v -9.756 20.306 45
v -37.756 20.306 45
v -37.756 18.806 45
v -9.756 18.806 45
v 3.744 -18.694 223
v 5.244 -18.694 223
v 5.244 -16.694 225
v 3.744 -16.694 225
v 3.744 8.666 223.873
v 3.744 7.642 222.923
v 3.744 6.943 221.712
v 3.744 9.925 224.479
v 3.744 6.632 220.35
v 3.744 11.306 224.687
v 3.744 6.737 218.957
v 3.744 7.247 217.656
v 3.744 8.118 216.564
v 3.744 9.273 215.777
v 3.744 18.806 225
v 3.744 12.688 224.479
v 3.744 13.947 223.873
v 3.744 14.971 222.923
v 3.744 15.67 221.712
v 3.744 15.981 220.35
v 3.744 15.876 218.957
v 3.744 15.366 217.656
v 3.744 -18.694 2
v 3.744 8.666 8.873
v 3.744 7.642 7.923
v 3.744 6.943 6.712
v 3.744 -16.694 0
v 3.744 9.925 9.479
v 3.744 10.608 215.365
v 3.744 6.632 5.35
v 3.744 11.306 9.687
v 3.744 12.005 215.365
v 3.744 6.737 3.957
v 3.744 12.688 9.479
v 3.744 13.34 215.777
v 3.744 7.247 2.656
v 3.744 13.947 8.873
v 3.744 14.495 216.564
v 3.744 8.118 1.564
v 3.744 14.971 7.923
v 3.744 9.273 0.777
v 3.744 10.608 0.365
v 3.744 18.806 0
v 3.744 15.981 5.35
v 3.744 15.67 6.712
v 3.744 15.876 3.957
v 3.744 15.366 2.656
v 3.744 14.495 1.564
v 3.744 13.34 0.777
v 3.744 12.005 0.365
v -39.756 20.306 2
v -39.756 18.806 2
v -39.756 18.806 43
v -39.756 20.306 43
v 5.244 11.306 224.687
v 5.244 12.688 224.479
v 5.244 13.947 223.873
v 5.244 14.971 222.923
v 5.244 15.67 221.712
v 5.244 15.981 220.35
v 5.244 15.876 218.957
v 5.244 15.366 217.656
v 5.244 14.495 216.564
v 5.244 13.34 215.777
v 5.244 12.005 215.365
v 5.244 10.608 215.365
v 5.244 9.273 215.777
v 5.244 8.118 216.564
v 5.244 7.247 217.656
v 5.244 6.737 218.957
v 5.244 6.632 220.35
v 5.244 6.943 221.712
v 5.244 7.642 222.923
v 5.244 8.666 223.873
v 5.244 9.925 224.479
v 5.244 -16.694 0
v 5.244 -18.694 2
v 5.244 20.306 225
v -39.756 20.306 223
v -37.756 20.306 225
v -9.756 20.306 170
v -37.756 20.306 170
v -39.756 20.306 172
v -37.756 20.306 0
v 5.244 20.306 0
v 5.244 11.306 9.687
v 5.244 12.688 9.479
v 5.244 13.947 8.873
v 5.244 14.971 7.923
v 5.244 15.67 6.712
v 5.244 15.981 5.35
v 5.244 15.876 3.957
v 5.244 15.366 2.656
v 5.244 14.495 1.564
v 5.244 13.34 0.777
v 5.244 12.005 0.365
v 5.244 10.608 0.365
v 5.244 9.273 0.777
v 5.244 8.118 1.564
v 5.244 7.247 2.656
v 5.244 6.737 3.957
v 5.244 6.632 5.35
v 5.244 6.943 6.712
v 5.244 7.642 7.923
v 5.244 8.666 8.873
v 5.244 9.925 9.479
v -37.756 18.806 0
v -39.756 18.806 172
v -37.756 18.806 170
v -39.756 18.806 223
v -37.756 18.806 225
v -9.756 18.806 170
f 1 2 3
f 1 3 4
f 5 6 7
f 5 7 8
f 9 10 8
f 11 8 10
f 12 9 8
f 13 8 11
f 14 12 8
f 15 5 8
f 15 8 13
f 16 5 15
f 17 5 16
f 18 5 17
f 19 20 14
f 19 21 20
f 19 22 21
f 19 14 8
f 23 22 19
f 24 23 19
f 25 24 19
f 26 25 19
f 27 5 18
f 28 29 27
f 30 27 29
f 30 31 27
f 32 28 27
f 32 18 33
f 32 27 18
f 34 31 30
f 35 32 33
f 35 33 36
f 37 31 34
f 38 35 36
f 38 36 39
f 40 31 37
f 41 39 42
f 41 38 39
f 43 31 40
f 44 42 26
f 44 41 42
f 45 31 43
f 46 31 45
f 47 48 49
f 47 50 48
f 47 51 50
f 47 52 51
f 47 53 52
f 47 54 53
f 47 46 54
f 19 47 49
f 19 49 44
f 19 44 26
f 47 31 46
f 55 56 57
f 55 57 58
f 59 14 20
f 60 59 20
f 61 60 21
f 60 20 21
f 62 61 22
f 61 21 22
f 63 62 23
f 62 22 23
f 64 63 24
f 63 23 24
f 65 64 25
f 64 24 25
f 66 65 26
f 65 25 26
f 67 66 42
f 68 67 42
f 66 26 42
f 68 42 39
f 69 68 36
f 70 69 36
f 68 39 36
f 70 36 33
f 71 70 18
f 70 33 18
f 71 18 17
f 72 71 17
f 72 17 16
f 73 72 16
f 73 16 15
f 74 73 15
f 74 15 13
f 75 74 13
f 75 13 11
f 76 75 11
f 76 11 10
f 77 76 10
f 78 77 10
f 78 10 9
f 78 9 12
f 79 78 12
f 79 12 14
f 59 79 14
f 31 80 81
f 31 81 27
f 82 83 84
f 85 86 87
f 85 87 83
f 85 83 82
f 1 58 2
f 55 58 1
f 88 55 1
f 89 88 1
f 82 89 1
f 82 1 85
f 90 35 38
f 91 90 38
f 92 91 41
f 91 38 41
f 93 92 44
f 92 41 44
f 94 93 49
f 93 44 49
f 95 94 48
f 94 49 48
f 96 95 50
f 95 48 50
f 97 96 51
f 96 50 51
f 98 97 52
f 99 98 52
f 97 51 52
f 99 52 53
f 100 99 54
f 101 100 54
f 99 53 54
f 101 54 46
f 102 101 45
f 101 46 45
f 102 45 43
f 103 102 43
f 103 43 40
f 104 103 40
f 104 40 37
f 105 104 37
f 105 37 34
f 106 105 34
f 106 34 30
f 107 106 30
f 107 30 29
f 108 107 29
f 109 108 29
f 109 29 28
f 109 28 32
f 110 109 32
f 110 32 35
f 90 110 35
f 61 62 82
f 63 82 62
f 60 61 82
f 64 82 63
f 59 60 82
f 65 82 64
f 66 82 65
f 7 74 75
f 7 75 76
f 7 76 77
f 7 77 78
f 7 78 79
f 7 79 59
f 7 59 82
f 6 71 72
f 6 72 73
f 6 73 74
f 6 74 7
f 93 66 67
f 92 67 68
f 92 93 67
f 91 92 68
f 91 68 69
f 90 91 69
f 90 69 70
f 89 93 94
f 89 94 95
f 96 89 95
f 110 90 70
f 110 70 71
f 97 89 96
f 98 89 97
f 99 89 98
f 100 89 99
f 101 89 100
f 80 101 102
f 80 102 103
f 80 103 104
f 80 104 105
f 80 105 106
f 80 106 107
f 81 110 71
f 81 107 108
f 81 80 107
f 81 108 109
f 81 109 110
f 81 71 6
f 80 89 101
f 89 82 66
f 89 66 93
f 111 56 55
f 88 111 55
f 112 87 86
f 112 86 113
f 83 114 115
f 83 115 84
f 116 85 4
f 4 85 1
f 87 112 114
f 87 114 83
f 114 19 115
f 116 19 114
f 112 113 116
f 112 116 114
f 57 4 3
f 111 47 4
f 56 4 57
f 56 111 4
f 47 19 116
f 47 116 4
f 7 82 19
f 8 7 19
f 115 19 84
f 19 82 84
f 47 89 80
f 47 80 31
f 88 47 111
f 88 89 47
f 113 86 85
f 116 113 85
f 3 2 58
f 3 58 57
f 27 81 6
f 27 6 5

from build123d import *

# Parameters (mm, degrees)
BOSS_EXTRUDE1_DEPTH = 225
SKETCH3_W           = 30
SKETCH3_H           = 125
CUT_EXTRUDE1_DEPTH  = 225
SKETCH4_R           = 4.687343619
CUT_EXTRUDE2_DEPTH  = 225
CHAMFER1_SIZE       = 2


with BuildPart() as part:
    # Sketch1 → Boss-Extrude1 (new body)
    with BuildSketch(Plane.XY):
        Polygon((-39.755639098, 20.306390977), (5.244360902, 20.306390977), (5.244360902, -18.693609023), (3.744360902, -18.693609023), (3.744360902, 18.806390977), (-39.755639098, 18.806390977), align=None)
    extrude(amount=BOSS_EXTRUDE1_DEPTH)

    # Sketch3 → Cut-Extrude1 (cut)
    with BuildSketch(Plane(origin=(0, 20.306390977, 0), x_dir=(1, 0, 0), z_dir=(0, 1, 0))):
        with Locations((-24.755639098, -107.5)):
            Rectangle(SKETCH3_W, SKETCH3_H)
    extrude(amount=-CUT_EXTRUDE1_DEPTH, mode=Mode.SUBTRACT)

    # Sketch4 → Cut-Extrude2 (cut)
    with BuildSketch(Plane.ZY.offset(-3.744360902)):
        with Locations((5, 11.306390977)):
            Circle(SKETCH4_R)
        with Locations((220, 11.306390977)):
            Circle(SKETCH4_R)
    extrude(amount=-CUT_EXTRUDE2_DEPTH, mode=Mode.SUBTRACT)

    # Chamfer1
    chamfer1_edges = [part.edges().sort_by_distance(p)[0] for p in [
        (4.494360902, -18.693609023, 225),
        (-39.755639098, 19.556390977, 170),
        (-39.755639098, 19.556390977, 45),
        (-39.755639098, 19.556390977, 225),
        (4.494360902, -18.693609023, 0),
        (-39.755639098, 19.556390977, 0),
    ]]
    chamfer(chamfer1_edges, length=CHAMFER1_SIZE)


solid = part.part
